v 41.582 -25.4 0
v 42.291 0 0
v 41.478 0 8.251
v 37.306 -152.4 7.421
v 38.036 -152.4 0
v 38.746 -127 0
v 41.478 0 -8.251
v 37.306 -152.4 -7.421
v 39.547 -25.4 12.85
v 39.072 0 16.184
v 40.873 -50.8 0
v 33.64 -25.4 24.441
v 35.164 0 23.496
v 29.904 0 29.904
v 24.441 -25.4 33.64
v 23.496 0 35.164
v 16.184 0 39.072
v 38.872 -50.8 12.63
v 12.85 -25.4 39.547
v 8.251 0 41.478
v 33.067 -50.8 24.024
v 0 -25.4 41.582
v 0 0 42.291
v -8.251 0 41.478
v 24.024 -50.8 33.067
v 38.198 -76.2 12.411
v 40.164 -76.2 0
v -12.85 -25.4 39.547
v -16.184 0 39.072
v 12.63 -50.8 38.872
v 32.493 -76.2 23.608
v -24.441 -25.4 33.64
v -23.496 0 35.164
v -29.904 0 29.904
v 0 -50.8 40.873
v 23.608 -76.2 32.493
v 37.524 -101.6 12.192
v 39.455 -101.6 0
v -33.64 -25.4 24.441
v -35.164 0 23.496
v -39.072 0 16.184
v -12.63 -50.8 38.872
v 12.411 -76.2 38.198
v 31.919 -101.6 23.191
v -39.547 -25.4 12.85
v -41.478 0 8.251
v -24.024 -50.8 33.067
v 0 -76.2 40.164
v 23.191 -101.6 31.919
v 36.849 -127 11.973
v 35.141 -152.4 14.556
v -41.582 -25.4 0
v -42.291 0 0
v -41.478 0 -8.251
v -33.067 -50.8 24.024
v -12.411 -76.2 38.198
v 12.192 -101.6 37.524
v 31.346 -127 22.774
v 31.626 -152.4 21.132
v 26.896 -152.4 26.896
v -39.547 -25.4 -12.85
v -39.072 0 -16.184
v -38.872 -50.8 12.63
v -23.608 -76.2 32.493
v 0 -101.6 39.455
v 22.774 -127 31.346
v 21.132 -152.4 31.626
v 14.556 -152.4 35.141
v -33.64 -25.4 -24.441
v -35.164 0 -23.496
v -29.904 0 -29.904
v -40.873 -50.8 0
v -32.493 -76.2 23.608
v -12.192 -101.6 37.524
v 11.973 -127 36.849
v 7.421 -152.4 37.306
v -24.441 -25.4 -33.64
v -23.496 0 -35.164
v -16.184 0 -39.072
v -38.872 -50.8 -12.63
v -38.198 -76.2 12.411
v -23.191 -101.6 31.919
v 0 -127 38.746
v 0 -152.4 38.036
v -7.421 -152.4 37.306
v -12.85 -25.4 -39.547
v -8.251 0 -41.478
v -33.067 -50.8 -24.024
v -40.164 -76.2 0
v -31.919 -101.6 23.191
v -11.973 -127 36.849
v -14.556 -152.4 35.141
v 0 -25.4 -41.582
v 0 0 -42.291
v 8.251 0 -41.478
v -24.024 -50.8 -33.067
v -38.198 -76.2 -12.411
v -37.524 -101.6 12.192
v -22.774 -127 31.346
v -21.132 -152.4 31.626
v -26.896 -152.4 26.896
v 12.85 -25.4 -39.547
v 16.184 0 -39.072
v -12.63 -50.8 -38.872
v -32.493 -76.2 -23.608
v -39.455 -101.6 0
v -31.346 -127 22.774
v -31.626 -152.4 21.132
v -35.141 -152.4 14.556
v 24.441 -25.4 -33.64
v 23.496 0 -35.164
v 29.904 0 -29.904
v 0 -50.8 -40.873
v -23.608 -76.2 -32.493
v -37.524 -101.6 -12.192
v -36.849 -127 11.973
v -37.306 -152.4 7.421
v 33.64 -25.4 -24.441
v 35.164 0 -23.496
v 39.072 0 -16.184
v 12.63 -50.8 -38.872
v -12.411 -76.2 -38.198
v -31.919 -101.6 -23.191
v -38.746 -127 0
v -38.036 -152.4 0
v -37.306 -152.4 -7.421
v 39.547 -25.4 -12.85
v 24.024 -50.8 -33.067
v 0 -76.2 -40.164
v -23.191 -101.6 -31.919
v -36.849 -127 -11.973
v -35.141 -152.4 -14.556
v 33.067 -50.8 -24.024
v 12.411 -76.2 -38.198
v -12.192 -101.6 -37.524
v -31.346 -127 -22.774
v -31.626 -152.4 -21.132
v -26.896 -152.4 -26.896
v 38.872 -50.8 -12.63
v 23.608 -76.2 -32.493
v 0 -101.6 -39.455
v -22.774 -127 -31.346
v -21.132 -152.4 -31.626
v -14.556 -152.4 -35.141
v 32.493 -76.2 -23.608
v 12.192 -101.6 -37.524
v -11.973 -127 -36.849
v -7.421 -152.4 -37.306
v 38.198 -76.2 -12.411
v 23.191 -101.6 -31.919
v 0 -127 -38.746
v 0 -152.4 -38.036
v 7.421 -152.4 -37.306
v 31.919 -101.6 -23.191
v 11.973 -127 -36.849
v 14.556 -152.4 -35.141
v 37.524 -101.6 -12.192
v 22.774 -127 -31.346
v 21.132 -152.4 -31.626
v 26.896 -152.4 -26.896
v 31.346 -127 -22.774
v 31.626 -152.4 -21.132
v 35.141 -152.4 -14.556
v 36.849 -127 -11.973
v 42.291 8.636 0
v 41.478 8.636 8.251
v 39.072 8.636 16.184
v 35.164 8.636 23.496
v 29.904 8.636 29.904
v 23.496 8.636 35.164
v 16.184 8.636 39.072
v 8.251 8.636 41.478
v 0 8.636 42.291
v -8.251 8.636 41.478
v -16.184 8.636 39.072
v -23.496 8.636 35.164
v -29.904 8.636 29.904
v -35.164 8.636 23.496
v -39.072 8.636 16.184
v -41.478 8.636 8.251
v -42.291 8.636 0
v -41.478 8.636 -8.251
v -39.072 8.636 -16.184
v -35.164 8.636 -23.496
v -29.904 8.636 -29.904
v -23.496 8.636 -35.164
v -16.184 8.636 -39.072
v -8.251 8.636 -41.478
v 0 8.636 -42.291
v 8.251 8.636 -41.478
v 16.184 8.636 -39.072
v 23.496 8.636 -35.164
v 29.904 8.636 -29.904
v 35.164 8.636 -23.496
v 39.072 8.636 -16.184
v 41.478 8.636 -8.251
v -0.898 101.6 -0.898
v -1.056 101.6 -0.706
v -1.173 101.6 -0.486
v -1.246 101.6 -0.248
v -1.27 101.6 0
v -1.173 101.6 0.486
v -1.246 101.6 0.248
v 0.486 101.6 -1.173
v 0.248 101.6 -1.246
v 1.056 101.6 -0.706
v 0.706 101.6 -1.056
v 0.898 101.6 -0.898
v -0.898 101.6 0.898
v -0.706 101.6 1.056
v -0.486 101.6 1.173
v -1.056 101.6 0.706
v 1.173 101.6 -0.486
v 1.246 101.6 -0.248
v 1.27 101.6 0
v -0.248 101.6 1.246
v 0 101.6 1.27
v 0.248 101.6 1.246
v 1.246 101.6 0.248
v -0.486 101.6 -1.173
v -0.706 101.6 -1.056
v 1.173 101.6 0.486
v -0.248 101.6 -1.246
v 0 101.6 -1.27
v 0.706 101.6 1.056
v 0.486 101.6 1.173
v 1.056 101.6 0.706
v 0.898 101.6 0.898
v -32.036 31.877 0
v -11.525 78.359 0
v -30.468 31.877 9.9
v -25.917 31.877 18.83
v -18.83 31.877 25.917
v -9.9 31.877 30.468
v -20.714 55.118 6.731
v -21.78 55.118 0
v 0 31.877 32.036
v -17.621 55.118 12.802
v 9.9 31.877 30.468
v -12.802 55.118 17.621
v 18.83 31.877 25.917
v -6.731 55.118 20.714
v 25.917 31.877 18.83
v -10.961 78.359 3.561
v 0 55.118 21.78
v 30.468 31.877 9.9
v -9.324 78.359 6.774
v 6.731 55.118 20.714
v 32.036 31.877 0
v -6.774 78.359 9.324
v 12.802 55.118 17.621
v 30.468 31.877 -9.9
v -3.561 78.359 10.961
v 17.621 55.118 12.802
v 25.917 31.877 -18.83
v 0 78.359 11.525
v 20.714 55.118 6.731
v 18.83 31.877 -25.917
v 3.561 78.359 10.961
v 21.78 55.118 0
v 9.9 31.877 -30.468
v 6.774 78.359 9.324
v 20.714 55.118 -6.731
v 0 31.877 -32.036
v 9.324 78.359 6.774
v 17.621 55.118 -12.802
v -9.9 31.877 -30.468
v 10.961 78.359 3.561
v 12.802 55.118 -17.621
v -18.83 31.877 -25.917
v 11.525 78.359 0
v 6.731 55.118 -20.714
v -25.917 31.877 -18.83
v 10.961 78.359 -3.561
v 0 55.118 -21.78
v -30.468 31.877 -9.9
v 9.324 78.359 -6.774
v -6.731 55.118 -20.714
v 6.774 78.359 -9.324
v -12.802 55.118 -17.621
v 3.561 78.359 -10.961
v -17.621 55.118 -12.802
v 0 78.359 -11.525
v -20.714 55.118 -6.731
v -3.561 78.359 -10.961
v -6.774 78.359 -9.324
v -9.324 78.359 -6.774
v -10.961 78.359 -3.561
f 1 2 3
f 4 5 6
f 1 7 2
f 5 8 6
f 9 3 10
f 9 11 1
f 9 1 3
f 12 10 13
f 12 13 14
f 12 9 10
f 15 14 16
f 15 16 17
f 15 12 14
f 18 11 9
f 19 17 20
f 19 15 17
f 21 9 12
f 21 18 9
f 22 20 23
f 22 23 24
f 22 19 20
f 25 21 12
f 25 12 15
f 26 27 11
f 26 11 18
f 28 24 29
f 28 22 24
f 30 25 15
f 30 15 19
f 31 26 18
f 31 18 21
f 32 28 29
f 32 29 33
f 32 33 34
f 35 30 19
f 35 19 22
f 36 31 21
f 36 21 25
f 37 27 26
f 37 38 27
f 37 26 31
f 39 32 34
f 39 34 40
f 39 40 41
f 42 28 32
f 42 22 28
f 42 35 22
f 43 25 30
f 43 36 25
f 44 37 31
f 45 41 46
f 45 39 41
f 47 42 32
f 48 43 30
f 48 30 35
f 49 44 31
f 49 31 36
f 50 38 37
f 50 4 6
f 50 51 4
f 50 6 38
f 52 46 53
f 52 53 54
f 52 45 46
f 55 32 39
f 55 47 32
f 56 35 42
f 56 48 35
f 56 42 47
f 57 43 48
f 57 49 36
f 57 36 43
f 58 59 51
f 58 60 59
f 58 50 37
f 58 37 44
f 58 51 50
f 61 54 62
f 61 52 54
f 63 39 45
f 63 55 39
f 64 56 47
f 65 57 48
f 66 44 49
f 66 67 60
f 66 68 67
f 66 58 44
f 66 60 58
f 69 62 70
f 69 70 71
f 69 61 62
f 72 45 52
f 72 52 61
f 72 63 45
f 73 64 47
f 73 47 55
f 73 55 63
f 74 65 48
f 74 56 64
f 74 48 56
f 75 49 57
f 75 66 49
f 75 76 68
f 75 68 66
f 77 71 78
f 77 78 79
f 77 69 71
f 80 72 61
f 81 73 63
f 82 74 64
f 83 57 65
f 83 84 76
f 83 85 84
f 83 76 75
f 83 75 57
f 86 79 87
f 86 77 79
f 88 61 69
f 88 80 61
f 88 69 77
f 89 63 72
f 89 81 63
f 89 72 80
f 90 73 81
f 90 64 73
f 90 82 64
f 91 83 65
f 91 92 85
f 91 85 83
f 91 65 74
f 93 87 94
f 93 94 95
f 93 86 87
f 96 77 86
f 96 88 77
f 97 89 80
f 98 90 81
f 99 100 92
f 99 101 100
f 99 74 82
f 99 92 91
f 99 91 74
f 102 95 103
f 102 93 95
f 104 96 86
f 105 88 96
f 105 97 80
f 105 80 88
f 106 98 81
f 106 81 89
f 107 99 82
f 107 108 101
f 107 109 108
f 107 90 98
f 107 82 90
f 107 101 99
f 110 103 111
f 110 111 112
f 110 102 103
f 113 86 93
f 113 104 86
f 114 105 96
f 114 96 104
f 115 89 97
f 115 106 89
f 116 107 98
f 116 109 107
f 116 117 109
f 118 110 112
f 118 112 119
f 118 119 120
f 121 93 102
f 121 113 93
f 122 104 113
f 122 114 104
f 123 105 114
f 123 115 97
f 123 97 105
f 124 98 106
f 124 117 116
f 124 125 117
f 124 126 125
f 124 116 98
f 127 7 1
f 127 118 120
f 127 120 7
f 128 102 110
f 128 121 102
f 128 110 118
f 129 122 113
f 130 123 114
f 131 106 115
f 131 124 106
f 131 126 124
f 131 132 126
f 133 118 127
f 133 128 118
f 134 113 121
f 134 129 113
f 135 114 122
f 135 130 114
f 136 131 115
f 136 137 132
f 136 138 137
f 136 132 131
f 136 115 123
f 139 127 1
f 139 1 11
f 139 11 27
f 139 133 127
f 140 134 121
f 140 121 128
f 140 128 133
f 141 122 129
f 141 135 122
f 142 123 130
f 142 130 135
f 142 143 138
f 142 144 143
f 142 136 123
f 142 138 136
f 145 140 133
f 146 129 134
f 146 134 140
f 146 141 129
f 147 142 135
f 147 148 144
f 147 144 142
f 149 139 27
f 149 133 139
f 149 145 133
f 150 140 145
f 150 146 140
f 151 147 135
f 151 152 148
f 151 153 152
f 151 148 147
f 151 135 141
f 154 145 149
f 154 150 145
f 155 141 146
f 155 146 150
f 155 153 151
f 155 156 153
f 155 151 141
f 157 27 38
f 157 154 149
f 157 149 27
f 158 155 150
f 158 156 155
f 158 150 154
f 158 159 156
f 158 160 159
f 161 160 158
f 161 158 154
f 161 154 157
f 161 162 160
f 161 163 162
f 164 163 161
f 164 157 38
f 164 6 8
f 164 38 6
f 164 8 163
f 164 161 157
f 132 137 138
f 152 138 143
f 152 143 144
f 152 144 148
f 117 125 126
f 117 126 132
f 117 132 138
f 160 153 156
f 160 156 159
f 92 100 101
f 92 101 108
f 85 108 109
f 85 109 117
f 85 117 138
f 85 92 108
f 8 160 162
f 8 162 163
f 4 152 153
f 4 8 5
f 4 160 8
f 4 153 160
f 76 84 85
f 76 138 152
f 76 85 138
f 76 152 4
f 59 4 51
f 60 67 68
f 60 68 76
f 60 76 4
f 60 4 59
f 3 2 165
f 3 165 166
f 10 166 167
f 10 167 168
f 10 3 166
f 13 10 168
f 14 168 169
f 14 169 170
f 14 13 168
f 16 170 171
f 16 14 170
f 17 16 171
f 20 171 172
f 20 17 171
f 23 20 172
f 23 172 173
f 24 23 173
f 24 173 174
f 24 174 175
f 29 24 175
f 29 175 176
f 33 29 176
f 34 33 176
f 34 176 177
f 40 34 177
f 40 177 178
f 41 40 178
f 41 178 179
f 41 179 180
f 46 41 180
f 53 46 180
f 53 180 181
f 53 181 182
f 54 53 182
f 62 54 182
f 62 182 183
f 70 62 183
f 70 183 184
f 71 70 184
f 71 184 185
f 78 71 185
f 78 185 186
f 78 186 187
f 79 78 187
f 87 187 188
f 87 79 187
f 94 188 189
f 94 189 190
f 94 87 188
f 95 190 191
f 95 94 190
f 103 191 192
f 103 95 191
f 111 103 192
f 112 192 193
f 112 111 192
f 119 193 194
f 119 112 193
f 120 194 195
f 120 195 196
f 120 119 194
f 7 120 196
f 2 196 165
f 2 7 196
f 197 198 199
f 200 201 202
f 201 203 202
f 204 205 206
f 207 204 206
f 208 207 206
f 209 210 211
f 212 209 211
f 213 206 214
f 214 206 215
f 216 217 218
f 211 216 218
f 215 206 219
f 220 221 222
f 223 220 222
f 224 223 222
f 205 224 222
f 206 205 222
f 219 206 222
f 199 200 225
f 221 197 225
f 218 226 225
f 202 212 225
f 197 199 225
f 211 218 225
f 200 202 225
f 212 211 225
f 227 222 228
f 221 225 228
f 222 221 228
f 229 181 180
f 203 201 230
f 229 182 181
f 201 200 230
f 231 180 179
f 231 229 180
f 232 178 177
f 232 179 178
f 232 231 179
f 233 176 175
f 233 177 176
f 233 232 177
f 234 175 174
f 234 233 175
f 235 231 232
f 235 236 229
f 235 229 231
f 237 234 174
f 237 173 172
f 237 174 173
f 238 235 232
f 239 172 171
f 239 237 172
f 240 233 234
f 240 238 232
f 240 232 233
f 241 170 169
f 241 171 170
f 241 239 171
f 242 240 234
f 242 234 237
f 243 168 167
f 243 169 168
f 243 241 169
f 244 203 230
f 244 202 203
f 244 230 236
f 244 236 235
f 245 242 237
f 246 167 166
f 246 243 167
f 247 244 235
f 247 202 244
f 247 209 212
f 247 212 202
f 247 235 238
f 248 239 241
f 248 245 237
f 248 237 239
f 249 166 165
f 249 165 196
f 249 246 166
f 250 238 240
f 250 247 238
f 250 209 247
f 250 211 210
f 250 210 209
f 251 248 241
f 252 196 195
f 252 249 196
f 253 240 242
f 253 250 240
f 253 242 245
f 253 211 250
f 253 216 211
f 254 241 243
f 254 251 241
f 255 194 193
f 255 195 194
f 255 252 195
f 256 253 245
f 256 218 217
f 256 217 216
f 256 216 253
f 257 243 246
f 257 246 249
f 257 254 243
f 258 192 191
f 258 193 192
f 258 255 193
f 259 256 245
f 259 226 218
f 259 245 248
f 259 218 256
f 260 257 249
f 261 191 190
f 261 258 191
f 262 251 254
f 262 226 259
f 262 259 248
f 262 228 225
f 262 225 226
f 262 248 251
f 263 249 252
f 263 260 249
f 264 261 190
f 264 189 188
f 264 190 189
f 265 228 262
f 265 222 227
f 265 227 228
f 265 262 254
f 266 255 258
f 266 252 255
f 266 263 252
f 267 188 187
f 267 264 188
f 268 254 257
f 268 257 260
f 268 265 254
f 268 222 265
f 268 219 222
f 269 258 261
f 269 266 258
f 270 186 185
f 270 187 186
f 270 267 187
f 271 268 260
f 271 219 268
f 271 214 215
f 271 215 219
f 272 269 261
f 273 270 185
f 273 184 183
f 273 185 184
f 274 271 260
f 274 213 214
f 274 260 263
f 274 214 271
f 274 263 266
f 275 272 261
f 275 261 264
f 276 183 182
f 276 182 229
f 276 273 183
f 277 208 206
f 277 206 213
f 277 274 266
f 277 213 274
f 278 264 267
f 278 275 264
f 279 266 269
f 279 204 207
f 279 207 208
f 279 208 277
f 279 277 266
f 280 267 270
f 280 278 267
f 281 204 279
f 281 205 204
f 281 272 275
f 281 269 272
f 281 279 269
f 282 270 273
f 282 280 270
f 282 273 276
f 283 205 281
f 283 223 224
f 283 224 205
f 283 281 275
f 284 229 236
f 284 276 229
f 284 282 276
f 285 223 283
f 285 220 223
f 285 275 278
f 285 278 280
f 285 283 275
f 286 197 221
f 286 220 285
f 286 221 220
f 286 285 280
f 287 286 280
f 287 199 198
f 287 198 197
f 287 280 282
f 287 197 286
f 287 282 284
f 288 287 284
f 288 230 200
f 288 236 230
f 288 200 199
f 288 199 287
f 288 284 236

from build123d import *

# Parameters (mm, degrees)
F1_R      = 42.291
F2_R      = 38.0365
F4_DEPTH  = 8.636
F4_FACE_R = 42.291
F6_R      = 1.27


with BuildPart() as f3:
    # F1 (on Front) → F3 section 0
    with BuildSketch(Plane.XZ):
        Circle(F1_R)
    # F2 (on offset) → F3 section 1
    with BuildSketch(Plane.XZ.offset(152.4)):
        Circle(F2_R)
    loft()

    # F4 (add): a face of the model
    f4_faces = [f3.faces().sort_by_distance(p)[0] for p in [
        (0, 0, 0),
    ]]
    extrude(f4_faces, amount=F4_DEPTH)

    # F4_face (on face) → F7 section 0
    with BuildSketch(Plane(origin=(0, 8.636, 0), x_dir=(-1, 0, 0), z_dir=(0, 1, 0))):
        Circle(F4_FACE_R)
    # F6 (on offset) → F7 section 1
    with BuildSketch(Plane.XZ.offset(-101.6)):
        Circle(F6_R)
    loft()


solid = f3.part
